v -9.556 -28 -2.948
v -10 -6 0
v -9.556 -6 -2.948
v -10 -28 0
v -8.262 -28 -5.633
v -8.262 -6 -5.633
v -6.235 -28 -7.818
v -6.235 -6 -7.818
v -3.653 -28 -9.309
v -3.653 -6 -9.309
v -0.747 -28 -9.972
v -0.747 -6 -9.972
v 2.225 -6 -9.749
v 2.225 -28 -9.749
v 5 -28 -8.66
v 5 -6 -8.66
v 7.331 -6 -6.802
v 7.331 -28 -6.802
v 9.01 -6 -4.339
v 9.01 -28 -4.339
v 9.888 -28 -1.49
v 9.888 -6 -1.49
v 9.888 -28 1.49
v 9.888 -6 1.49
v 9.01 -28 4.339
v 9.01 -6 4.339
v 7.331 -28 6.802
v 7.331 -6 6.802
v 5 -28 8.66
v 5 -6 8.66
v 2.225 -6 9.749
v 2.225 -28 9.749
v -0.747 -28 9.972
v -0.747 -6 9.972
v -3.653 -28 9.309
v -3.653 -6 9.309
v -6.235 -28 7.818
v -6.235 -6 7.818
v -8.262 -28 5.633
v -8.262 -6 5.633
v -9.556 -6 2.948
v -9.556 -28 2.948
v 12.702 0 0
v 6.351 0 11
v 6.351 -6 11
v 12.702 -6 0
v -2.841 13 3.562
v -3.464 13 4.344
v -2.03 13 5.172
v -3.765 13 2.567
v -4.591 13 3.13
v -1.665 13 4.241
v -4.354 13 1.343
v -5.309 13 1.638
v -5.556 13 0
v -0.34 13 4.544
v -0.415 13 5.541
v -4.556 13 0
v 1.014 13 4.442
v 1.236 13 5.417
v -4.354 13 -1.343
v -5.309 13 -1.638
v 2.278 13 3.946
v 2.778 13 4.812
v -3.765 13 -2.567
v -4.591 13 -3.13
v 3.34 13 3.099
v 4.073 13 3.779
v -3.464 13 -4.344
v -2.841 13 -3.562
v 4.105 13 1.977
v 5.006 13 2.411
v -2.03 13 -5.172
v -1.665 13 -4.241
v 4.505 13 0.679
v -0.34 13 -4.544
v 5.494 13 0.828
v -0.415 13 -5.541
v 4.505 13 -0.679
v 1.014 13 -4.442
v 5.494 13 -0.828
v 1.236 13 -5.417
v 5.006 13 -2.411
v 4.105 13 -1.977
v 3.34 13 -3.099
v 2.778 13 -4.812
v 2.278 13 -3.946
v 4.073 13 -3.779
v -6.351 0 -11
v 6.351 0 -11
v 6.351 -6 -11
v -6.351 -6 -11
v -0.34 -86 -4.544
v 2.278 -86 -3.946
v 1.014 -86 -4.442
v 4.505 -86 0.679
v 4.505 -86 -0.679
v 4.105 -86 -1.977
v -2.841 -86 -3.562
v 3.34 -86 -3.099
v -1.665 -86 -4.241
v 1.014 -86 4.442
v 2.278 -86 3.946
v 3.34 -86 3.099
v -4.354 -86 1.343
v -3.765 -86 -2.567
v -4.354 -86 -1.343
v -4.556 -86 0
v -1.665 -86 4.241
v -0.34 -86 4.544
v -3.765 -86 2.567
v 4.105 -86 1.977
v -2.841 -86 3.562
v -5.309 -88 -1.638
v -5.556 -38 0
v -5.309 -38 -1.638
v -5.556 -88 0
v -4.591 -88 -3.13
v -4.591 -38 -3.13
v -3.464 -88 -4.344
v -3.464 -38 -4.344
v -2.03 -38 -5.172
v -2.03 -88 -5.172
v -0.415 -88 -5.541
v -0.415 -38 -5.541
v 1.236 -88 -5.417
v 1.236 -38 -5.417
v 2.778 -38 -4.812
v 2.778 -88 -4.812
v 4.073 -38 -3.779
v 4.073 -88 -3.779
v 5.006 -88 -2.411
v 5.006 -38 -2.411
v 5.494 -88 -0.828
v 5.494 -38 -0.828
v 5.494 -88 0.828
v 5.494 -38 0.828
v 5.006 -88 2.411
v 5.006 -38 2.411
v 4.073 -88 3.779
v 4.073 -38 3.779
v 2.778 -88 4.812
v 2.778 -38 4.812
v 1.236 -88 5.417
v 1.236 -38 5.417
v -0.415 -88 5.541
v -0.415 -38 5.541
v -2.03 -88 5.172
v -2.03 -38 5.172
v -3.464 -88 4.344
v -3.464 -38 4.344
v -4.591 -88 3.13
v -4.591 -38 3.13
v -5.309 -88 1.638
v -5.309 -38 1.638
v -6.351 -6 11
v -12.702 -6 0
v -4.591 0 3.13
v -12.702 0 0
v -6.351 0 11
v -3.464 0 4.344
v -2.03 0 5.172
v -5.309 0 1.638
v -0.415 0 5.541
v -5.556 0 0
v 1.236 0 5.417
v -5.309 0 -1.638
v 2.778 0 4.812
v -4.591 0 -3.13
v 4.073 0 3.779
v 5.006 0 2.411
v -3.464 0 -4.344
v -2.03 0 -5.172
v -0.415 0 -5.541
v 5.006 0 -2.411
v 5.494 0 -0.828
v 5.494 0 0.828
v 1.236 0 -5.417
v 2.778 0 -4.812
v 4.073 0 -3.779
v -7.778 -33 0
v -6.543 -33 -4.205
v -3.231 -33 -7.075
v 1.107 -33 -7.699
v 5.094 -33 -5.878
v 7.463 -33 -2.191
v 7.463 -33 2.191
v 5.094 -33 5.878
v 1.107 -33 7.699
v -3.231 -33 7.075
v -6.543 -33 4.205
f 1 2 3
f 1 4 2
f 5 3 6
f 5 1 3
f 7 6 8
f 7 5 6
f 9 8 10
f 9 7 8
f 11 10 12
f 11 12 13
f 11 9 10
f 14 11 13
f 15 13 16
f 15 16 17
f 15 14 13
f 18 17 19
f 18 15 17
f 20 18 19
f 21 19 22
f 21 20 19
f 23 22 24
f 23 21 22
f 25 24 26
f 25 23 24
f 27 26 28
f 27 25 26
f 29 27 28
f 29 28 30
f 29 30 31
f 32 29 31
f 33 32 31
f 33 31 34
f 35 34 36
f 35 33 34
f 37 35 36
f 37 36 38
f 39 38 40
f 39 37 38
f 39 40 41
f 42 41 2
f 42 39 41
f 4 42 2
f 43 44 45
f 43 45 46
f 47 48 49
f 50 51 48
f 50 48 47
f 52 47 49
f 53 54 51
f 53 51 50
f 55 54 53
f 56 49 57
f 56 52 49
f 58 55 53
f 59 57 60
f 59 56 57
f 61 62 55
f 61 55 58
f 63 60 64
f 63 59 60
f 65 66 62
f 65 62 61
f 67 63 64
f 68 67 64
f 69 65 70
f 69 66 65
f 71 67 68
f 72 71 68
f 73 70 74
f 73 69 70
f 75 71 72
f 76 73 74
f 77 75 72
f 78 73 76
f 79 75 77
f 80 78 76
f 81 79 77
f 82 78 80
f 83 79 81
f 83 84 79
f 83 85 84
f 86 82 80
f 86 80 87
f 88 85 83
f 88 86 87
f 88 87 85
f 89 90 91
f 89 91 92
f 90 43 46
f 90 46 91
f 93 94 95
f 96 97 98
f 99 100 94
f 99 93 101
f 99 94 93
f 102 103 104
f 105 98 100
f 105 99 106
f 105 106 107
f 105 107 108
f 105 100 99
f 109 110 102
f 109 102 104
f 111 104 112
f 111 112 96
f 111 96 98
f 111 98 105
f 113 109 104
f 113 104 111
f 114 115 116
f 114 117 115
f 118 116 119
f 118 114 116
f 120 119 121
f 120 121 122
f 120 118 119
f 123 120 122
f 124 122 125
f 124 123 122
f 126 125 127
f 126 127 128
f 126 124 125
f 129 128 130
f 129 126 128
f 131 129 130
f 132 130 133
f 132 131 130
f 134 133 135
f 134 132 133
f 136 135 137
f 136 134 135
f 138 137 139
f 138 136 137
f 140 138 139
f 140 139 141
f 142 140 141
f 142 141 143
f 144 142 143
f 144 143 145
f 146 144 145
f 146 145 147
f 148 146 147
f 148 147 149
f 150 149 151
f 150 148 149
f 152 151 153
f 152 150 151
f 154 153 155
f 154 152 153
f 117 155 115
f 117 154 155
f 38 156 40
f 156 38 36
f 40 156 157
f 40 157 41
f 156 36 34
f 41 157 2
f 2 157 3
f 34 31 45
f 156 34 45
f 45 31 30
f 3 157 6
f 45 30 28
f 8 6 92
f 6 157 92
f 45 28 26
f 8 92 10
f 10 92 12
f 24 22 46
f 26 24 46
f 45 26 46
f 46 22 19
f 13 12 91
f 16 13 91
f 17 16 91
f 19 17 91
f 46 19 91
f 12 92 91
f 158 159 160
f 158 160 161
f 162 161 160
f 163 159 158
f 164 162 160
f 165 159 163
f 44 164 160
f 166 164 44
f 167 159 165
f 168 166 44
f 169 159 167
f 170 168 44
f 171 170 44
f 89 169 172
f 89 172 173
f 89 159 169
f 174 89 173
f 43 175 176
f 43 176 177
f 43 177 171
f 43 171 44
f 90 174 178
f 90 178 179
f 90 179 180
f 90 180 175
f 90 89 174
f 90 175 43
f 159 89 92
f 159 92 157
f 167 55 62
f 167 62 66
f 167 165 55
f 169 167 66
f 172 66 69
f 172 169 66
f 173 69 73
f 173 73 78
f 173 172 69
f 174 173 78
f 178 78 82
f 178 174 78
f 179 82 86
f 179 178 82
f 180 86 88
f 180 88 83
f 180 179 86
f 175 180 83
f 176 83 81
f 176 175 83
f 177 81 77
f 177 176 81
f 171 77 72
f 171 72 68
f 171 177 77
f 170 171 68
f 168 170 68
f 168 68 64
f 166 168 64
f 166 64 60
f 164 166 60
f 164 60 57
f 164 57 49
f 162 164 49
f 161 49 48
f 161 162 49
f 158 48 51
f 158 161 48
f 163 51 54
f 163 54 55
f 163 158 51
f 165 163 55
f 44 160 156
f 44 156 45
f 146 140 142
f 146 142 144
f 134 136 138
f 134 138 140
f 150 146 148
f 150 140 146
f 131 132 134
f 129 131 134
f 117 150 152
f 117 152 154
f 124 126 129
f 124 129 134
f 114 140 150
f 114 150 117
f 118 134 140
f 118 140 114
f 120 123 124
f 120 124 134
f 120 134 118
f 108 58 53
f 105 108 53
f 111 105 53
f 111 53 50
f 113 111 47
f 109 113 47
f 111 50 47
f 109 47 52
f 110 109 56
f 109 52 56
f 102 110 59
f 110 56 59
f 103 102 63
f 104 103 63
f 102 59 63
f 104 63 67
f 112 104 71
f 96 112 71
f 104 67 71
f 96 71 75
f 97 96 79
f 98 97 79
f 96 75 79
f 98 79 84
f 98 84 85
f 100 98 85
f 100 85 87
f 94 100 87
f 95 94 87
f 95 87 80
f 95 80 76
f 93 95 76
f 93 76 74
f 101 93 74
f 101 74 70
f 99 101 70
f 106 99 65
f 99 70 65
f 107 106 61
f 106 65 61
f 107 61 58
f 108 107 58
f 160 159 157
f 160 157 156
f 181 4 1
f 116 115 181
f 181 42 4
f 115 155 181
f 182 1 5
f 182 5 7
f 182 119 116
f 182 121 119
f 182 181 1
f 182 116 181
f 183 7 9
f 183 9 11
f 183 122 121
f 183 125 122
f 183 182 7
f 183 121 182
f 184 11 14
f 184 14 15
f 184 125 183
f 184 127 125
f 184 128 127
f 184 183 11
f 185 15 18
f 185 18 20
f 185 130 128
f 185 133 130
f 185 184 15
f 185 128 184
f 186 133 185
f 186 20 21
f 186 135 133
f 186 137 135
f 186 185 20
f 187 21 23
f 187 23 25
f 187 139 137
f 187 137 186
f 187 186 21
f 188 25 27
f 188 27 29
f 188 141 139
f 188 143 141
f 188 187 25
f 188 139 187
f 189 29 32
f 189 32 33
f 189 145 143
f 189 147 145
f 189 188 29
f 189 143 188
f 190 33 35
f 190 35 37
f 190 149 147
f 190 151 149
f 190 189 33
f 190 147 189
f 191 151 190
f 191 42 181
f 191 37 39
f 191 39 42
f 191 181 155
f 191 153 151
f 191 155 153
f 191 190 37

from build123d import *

# Parameters (mm, degrees)
BOSS_EXTRUDE1_DEPTH = 6
SKETCH3_R           = 4.55625
CUT_EXTRUDE1_DEPTH  = 99


with BuildPart() as part:
    # Sketch1 → Revolve1 (revolve)
    with BuildSketch(Plane.XY, mode=Mode.PRIVATE) as revolve1_sk:
        Polygon((0, 13), (5.55625, 13), (5.55625, 0), (10, 0), (10, -28), (5.55625, -38), (5.55625, -88), (0, -88), align=None)
    revolve(revolve1_sk.sketch.rotate(Axis((0, 13, 0), (0, -1, 0)), 180), axis=Axis((0, 13, 0), (0, -1, 0)))

    # Sketch2 → Boss-Extrude1 (add)
    with BuildSketch(Plane(origin=(0, 0, 0), x_dir=(1, 0, 0), z_dir=(0, 1, 0))):
        Polygon((12.701705922, 0), (6.350852961, 11), (-6.350852961, 11), (-12.701705922, 0), (-6.350852961, -11), (6.350852961, -11), align=None)
    extrude(amount=-BOSS_EXTRUDE1_DEPTH)

    # Sketch3 → Cut-Extrude1 (cut)
    with BuildSketch(Plane(origin=(0, 13, 0), x_dir=(1, 0, 0), z_dir=(0, 1, 0))):
        with Locations(Location((0, 0, 0), (0, 0, 180))):
            Circle(SKETCH3_R)
    extrude(amount=-CUT_EXTRUDE1_DEPTH, mode=Mode.SUBTRACT)


solid = part.part
